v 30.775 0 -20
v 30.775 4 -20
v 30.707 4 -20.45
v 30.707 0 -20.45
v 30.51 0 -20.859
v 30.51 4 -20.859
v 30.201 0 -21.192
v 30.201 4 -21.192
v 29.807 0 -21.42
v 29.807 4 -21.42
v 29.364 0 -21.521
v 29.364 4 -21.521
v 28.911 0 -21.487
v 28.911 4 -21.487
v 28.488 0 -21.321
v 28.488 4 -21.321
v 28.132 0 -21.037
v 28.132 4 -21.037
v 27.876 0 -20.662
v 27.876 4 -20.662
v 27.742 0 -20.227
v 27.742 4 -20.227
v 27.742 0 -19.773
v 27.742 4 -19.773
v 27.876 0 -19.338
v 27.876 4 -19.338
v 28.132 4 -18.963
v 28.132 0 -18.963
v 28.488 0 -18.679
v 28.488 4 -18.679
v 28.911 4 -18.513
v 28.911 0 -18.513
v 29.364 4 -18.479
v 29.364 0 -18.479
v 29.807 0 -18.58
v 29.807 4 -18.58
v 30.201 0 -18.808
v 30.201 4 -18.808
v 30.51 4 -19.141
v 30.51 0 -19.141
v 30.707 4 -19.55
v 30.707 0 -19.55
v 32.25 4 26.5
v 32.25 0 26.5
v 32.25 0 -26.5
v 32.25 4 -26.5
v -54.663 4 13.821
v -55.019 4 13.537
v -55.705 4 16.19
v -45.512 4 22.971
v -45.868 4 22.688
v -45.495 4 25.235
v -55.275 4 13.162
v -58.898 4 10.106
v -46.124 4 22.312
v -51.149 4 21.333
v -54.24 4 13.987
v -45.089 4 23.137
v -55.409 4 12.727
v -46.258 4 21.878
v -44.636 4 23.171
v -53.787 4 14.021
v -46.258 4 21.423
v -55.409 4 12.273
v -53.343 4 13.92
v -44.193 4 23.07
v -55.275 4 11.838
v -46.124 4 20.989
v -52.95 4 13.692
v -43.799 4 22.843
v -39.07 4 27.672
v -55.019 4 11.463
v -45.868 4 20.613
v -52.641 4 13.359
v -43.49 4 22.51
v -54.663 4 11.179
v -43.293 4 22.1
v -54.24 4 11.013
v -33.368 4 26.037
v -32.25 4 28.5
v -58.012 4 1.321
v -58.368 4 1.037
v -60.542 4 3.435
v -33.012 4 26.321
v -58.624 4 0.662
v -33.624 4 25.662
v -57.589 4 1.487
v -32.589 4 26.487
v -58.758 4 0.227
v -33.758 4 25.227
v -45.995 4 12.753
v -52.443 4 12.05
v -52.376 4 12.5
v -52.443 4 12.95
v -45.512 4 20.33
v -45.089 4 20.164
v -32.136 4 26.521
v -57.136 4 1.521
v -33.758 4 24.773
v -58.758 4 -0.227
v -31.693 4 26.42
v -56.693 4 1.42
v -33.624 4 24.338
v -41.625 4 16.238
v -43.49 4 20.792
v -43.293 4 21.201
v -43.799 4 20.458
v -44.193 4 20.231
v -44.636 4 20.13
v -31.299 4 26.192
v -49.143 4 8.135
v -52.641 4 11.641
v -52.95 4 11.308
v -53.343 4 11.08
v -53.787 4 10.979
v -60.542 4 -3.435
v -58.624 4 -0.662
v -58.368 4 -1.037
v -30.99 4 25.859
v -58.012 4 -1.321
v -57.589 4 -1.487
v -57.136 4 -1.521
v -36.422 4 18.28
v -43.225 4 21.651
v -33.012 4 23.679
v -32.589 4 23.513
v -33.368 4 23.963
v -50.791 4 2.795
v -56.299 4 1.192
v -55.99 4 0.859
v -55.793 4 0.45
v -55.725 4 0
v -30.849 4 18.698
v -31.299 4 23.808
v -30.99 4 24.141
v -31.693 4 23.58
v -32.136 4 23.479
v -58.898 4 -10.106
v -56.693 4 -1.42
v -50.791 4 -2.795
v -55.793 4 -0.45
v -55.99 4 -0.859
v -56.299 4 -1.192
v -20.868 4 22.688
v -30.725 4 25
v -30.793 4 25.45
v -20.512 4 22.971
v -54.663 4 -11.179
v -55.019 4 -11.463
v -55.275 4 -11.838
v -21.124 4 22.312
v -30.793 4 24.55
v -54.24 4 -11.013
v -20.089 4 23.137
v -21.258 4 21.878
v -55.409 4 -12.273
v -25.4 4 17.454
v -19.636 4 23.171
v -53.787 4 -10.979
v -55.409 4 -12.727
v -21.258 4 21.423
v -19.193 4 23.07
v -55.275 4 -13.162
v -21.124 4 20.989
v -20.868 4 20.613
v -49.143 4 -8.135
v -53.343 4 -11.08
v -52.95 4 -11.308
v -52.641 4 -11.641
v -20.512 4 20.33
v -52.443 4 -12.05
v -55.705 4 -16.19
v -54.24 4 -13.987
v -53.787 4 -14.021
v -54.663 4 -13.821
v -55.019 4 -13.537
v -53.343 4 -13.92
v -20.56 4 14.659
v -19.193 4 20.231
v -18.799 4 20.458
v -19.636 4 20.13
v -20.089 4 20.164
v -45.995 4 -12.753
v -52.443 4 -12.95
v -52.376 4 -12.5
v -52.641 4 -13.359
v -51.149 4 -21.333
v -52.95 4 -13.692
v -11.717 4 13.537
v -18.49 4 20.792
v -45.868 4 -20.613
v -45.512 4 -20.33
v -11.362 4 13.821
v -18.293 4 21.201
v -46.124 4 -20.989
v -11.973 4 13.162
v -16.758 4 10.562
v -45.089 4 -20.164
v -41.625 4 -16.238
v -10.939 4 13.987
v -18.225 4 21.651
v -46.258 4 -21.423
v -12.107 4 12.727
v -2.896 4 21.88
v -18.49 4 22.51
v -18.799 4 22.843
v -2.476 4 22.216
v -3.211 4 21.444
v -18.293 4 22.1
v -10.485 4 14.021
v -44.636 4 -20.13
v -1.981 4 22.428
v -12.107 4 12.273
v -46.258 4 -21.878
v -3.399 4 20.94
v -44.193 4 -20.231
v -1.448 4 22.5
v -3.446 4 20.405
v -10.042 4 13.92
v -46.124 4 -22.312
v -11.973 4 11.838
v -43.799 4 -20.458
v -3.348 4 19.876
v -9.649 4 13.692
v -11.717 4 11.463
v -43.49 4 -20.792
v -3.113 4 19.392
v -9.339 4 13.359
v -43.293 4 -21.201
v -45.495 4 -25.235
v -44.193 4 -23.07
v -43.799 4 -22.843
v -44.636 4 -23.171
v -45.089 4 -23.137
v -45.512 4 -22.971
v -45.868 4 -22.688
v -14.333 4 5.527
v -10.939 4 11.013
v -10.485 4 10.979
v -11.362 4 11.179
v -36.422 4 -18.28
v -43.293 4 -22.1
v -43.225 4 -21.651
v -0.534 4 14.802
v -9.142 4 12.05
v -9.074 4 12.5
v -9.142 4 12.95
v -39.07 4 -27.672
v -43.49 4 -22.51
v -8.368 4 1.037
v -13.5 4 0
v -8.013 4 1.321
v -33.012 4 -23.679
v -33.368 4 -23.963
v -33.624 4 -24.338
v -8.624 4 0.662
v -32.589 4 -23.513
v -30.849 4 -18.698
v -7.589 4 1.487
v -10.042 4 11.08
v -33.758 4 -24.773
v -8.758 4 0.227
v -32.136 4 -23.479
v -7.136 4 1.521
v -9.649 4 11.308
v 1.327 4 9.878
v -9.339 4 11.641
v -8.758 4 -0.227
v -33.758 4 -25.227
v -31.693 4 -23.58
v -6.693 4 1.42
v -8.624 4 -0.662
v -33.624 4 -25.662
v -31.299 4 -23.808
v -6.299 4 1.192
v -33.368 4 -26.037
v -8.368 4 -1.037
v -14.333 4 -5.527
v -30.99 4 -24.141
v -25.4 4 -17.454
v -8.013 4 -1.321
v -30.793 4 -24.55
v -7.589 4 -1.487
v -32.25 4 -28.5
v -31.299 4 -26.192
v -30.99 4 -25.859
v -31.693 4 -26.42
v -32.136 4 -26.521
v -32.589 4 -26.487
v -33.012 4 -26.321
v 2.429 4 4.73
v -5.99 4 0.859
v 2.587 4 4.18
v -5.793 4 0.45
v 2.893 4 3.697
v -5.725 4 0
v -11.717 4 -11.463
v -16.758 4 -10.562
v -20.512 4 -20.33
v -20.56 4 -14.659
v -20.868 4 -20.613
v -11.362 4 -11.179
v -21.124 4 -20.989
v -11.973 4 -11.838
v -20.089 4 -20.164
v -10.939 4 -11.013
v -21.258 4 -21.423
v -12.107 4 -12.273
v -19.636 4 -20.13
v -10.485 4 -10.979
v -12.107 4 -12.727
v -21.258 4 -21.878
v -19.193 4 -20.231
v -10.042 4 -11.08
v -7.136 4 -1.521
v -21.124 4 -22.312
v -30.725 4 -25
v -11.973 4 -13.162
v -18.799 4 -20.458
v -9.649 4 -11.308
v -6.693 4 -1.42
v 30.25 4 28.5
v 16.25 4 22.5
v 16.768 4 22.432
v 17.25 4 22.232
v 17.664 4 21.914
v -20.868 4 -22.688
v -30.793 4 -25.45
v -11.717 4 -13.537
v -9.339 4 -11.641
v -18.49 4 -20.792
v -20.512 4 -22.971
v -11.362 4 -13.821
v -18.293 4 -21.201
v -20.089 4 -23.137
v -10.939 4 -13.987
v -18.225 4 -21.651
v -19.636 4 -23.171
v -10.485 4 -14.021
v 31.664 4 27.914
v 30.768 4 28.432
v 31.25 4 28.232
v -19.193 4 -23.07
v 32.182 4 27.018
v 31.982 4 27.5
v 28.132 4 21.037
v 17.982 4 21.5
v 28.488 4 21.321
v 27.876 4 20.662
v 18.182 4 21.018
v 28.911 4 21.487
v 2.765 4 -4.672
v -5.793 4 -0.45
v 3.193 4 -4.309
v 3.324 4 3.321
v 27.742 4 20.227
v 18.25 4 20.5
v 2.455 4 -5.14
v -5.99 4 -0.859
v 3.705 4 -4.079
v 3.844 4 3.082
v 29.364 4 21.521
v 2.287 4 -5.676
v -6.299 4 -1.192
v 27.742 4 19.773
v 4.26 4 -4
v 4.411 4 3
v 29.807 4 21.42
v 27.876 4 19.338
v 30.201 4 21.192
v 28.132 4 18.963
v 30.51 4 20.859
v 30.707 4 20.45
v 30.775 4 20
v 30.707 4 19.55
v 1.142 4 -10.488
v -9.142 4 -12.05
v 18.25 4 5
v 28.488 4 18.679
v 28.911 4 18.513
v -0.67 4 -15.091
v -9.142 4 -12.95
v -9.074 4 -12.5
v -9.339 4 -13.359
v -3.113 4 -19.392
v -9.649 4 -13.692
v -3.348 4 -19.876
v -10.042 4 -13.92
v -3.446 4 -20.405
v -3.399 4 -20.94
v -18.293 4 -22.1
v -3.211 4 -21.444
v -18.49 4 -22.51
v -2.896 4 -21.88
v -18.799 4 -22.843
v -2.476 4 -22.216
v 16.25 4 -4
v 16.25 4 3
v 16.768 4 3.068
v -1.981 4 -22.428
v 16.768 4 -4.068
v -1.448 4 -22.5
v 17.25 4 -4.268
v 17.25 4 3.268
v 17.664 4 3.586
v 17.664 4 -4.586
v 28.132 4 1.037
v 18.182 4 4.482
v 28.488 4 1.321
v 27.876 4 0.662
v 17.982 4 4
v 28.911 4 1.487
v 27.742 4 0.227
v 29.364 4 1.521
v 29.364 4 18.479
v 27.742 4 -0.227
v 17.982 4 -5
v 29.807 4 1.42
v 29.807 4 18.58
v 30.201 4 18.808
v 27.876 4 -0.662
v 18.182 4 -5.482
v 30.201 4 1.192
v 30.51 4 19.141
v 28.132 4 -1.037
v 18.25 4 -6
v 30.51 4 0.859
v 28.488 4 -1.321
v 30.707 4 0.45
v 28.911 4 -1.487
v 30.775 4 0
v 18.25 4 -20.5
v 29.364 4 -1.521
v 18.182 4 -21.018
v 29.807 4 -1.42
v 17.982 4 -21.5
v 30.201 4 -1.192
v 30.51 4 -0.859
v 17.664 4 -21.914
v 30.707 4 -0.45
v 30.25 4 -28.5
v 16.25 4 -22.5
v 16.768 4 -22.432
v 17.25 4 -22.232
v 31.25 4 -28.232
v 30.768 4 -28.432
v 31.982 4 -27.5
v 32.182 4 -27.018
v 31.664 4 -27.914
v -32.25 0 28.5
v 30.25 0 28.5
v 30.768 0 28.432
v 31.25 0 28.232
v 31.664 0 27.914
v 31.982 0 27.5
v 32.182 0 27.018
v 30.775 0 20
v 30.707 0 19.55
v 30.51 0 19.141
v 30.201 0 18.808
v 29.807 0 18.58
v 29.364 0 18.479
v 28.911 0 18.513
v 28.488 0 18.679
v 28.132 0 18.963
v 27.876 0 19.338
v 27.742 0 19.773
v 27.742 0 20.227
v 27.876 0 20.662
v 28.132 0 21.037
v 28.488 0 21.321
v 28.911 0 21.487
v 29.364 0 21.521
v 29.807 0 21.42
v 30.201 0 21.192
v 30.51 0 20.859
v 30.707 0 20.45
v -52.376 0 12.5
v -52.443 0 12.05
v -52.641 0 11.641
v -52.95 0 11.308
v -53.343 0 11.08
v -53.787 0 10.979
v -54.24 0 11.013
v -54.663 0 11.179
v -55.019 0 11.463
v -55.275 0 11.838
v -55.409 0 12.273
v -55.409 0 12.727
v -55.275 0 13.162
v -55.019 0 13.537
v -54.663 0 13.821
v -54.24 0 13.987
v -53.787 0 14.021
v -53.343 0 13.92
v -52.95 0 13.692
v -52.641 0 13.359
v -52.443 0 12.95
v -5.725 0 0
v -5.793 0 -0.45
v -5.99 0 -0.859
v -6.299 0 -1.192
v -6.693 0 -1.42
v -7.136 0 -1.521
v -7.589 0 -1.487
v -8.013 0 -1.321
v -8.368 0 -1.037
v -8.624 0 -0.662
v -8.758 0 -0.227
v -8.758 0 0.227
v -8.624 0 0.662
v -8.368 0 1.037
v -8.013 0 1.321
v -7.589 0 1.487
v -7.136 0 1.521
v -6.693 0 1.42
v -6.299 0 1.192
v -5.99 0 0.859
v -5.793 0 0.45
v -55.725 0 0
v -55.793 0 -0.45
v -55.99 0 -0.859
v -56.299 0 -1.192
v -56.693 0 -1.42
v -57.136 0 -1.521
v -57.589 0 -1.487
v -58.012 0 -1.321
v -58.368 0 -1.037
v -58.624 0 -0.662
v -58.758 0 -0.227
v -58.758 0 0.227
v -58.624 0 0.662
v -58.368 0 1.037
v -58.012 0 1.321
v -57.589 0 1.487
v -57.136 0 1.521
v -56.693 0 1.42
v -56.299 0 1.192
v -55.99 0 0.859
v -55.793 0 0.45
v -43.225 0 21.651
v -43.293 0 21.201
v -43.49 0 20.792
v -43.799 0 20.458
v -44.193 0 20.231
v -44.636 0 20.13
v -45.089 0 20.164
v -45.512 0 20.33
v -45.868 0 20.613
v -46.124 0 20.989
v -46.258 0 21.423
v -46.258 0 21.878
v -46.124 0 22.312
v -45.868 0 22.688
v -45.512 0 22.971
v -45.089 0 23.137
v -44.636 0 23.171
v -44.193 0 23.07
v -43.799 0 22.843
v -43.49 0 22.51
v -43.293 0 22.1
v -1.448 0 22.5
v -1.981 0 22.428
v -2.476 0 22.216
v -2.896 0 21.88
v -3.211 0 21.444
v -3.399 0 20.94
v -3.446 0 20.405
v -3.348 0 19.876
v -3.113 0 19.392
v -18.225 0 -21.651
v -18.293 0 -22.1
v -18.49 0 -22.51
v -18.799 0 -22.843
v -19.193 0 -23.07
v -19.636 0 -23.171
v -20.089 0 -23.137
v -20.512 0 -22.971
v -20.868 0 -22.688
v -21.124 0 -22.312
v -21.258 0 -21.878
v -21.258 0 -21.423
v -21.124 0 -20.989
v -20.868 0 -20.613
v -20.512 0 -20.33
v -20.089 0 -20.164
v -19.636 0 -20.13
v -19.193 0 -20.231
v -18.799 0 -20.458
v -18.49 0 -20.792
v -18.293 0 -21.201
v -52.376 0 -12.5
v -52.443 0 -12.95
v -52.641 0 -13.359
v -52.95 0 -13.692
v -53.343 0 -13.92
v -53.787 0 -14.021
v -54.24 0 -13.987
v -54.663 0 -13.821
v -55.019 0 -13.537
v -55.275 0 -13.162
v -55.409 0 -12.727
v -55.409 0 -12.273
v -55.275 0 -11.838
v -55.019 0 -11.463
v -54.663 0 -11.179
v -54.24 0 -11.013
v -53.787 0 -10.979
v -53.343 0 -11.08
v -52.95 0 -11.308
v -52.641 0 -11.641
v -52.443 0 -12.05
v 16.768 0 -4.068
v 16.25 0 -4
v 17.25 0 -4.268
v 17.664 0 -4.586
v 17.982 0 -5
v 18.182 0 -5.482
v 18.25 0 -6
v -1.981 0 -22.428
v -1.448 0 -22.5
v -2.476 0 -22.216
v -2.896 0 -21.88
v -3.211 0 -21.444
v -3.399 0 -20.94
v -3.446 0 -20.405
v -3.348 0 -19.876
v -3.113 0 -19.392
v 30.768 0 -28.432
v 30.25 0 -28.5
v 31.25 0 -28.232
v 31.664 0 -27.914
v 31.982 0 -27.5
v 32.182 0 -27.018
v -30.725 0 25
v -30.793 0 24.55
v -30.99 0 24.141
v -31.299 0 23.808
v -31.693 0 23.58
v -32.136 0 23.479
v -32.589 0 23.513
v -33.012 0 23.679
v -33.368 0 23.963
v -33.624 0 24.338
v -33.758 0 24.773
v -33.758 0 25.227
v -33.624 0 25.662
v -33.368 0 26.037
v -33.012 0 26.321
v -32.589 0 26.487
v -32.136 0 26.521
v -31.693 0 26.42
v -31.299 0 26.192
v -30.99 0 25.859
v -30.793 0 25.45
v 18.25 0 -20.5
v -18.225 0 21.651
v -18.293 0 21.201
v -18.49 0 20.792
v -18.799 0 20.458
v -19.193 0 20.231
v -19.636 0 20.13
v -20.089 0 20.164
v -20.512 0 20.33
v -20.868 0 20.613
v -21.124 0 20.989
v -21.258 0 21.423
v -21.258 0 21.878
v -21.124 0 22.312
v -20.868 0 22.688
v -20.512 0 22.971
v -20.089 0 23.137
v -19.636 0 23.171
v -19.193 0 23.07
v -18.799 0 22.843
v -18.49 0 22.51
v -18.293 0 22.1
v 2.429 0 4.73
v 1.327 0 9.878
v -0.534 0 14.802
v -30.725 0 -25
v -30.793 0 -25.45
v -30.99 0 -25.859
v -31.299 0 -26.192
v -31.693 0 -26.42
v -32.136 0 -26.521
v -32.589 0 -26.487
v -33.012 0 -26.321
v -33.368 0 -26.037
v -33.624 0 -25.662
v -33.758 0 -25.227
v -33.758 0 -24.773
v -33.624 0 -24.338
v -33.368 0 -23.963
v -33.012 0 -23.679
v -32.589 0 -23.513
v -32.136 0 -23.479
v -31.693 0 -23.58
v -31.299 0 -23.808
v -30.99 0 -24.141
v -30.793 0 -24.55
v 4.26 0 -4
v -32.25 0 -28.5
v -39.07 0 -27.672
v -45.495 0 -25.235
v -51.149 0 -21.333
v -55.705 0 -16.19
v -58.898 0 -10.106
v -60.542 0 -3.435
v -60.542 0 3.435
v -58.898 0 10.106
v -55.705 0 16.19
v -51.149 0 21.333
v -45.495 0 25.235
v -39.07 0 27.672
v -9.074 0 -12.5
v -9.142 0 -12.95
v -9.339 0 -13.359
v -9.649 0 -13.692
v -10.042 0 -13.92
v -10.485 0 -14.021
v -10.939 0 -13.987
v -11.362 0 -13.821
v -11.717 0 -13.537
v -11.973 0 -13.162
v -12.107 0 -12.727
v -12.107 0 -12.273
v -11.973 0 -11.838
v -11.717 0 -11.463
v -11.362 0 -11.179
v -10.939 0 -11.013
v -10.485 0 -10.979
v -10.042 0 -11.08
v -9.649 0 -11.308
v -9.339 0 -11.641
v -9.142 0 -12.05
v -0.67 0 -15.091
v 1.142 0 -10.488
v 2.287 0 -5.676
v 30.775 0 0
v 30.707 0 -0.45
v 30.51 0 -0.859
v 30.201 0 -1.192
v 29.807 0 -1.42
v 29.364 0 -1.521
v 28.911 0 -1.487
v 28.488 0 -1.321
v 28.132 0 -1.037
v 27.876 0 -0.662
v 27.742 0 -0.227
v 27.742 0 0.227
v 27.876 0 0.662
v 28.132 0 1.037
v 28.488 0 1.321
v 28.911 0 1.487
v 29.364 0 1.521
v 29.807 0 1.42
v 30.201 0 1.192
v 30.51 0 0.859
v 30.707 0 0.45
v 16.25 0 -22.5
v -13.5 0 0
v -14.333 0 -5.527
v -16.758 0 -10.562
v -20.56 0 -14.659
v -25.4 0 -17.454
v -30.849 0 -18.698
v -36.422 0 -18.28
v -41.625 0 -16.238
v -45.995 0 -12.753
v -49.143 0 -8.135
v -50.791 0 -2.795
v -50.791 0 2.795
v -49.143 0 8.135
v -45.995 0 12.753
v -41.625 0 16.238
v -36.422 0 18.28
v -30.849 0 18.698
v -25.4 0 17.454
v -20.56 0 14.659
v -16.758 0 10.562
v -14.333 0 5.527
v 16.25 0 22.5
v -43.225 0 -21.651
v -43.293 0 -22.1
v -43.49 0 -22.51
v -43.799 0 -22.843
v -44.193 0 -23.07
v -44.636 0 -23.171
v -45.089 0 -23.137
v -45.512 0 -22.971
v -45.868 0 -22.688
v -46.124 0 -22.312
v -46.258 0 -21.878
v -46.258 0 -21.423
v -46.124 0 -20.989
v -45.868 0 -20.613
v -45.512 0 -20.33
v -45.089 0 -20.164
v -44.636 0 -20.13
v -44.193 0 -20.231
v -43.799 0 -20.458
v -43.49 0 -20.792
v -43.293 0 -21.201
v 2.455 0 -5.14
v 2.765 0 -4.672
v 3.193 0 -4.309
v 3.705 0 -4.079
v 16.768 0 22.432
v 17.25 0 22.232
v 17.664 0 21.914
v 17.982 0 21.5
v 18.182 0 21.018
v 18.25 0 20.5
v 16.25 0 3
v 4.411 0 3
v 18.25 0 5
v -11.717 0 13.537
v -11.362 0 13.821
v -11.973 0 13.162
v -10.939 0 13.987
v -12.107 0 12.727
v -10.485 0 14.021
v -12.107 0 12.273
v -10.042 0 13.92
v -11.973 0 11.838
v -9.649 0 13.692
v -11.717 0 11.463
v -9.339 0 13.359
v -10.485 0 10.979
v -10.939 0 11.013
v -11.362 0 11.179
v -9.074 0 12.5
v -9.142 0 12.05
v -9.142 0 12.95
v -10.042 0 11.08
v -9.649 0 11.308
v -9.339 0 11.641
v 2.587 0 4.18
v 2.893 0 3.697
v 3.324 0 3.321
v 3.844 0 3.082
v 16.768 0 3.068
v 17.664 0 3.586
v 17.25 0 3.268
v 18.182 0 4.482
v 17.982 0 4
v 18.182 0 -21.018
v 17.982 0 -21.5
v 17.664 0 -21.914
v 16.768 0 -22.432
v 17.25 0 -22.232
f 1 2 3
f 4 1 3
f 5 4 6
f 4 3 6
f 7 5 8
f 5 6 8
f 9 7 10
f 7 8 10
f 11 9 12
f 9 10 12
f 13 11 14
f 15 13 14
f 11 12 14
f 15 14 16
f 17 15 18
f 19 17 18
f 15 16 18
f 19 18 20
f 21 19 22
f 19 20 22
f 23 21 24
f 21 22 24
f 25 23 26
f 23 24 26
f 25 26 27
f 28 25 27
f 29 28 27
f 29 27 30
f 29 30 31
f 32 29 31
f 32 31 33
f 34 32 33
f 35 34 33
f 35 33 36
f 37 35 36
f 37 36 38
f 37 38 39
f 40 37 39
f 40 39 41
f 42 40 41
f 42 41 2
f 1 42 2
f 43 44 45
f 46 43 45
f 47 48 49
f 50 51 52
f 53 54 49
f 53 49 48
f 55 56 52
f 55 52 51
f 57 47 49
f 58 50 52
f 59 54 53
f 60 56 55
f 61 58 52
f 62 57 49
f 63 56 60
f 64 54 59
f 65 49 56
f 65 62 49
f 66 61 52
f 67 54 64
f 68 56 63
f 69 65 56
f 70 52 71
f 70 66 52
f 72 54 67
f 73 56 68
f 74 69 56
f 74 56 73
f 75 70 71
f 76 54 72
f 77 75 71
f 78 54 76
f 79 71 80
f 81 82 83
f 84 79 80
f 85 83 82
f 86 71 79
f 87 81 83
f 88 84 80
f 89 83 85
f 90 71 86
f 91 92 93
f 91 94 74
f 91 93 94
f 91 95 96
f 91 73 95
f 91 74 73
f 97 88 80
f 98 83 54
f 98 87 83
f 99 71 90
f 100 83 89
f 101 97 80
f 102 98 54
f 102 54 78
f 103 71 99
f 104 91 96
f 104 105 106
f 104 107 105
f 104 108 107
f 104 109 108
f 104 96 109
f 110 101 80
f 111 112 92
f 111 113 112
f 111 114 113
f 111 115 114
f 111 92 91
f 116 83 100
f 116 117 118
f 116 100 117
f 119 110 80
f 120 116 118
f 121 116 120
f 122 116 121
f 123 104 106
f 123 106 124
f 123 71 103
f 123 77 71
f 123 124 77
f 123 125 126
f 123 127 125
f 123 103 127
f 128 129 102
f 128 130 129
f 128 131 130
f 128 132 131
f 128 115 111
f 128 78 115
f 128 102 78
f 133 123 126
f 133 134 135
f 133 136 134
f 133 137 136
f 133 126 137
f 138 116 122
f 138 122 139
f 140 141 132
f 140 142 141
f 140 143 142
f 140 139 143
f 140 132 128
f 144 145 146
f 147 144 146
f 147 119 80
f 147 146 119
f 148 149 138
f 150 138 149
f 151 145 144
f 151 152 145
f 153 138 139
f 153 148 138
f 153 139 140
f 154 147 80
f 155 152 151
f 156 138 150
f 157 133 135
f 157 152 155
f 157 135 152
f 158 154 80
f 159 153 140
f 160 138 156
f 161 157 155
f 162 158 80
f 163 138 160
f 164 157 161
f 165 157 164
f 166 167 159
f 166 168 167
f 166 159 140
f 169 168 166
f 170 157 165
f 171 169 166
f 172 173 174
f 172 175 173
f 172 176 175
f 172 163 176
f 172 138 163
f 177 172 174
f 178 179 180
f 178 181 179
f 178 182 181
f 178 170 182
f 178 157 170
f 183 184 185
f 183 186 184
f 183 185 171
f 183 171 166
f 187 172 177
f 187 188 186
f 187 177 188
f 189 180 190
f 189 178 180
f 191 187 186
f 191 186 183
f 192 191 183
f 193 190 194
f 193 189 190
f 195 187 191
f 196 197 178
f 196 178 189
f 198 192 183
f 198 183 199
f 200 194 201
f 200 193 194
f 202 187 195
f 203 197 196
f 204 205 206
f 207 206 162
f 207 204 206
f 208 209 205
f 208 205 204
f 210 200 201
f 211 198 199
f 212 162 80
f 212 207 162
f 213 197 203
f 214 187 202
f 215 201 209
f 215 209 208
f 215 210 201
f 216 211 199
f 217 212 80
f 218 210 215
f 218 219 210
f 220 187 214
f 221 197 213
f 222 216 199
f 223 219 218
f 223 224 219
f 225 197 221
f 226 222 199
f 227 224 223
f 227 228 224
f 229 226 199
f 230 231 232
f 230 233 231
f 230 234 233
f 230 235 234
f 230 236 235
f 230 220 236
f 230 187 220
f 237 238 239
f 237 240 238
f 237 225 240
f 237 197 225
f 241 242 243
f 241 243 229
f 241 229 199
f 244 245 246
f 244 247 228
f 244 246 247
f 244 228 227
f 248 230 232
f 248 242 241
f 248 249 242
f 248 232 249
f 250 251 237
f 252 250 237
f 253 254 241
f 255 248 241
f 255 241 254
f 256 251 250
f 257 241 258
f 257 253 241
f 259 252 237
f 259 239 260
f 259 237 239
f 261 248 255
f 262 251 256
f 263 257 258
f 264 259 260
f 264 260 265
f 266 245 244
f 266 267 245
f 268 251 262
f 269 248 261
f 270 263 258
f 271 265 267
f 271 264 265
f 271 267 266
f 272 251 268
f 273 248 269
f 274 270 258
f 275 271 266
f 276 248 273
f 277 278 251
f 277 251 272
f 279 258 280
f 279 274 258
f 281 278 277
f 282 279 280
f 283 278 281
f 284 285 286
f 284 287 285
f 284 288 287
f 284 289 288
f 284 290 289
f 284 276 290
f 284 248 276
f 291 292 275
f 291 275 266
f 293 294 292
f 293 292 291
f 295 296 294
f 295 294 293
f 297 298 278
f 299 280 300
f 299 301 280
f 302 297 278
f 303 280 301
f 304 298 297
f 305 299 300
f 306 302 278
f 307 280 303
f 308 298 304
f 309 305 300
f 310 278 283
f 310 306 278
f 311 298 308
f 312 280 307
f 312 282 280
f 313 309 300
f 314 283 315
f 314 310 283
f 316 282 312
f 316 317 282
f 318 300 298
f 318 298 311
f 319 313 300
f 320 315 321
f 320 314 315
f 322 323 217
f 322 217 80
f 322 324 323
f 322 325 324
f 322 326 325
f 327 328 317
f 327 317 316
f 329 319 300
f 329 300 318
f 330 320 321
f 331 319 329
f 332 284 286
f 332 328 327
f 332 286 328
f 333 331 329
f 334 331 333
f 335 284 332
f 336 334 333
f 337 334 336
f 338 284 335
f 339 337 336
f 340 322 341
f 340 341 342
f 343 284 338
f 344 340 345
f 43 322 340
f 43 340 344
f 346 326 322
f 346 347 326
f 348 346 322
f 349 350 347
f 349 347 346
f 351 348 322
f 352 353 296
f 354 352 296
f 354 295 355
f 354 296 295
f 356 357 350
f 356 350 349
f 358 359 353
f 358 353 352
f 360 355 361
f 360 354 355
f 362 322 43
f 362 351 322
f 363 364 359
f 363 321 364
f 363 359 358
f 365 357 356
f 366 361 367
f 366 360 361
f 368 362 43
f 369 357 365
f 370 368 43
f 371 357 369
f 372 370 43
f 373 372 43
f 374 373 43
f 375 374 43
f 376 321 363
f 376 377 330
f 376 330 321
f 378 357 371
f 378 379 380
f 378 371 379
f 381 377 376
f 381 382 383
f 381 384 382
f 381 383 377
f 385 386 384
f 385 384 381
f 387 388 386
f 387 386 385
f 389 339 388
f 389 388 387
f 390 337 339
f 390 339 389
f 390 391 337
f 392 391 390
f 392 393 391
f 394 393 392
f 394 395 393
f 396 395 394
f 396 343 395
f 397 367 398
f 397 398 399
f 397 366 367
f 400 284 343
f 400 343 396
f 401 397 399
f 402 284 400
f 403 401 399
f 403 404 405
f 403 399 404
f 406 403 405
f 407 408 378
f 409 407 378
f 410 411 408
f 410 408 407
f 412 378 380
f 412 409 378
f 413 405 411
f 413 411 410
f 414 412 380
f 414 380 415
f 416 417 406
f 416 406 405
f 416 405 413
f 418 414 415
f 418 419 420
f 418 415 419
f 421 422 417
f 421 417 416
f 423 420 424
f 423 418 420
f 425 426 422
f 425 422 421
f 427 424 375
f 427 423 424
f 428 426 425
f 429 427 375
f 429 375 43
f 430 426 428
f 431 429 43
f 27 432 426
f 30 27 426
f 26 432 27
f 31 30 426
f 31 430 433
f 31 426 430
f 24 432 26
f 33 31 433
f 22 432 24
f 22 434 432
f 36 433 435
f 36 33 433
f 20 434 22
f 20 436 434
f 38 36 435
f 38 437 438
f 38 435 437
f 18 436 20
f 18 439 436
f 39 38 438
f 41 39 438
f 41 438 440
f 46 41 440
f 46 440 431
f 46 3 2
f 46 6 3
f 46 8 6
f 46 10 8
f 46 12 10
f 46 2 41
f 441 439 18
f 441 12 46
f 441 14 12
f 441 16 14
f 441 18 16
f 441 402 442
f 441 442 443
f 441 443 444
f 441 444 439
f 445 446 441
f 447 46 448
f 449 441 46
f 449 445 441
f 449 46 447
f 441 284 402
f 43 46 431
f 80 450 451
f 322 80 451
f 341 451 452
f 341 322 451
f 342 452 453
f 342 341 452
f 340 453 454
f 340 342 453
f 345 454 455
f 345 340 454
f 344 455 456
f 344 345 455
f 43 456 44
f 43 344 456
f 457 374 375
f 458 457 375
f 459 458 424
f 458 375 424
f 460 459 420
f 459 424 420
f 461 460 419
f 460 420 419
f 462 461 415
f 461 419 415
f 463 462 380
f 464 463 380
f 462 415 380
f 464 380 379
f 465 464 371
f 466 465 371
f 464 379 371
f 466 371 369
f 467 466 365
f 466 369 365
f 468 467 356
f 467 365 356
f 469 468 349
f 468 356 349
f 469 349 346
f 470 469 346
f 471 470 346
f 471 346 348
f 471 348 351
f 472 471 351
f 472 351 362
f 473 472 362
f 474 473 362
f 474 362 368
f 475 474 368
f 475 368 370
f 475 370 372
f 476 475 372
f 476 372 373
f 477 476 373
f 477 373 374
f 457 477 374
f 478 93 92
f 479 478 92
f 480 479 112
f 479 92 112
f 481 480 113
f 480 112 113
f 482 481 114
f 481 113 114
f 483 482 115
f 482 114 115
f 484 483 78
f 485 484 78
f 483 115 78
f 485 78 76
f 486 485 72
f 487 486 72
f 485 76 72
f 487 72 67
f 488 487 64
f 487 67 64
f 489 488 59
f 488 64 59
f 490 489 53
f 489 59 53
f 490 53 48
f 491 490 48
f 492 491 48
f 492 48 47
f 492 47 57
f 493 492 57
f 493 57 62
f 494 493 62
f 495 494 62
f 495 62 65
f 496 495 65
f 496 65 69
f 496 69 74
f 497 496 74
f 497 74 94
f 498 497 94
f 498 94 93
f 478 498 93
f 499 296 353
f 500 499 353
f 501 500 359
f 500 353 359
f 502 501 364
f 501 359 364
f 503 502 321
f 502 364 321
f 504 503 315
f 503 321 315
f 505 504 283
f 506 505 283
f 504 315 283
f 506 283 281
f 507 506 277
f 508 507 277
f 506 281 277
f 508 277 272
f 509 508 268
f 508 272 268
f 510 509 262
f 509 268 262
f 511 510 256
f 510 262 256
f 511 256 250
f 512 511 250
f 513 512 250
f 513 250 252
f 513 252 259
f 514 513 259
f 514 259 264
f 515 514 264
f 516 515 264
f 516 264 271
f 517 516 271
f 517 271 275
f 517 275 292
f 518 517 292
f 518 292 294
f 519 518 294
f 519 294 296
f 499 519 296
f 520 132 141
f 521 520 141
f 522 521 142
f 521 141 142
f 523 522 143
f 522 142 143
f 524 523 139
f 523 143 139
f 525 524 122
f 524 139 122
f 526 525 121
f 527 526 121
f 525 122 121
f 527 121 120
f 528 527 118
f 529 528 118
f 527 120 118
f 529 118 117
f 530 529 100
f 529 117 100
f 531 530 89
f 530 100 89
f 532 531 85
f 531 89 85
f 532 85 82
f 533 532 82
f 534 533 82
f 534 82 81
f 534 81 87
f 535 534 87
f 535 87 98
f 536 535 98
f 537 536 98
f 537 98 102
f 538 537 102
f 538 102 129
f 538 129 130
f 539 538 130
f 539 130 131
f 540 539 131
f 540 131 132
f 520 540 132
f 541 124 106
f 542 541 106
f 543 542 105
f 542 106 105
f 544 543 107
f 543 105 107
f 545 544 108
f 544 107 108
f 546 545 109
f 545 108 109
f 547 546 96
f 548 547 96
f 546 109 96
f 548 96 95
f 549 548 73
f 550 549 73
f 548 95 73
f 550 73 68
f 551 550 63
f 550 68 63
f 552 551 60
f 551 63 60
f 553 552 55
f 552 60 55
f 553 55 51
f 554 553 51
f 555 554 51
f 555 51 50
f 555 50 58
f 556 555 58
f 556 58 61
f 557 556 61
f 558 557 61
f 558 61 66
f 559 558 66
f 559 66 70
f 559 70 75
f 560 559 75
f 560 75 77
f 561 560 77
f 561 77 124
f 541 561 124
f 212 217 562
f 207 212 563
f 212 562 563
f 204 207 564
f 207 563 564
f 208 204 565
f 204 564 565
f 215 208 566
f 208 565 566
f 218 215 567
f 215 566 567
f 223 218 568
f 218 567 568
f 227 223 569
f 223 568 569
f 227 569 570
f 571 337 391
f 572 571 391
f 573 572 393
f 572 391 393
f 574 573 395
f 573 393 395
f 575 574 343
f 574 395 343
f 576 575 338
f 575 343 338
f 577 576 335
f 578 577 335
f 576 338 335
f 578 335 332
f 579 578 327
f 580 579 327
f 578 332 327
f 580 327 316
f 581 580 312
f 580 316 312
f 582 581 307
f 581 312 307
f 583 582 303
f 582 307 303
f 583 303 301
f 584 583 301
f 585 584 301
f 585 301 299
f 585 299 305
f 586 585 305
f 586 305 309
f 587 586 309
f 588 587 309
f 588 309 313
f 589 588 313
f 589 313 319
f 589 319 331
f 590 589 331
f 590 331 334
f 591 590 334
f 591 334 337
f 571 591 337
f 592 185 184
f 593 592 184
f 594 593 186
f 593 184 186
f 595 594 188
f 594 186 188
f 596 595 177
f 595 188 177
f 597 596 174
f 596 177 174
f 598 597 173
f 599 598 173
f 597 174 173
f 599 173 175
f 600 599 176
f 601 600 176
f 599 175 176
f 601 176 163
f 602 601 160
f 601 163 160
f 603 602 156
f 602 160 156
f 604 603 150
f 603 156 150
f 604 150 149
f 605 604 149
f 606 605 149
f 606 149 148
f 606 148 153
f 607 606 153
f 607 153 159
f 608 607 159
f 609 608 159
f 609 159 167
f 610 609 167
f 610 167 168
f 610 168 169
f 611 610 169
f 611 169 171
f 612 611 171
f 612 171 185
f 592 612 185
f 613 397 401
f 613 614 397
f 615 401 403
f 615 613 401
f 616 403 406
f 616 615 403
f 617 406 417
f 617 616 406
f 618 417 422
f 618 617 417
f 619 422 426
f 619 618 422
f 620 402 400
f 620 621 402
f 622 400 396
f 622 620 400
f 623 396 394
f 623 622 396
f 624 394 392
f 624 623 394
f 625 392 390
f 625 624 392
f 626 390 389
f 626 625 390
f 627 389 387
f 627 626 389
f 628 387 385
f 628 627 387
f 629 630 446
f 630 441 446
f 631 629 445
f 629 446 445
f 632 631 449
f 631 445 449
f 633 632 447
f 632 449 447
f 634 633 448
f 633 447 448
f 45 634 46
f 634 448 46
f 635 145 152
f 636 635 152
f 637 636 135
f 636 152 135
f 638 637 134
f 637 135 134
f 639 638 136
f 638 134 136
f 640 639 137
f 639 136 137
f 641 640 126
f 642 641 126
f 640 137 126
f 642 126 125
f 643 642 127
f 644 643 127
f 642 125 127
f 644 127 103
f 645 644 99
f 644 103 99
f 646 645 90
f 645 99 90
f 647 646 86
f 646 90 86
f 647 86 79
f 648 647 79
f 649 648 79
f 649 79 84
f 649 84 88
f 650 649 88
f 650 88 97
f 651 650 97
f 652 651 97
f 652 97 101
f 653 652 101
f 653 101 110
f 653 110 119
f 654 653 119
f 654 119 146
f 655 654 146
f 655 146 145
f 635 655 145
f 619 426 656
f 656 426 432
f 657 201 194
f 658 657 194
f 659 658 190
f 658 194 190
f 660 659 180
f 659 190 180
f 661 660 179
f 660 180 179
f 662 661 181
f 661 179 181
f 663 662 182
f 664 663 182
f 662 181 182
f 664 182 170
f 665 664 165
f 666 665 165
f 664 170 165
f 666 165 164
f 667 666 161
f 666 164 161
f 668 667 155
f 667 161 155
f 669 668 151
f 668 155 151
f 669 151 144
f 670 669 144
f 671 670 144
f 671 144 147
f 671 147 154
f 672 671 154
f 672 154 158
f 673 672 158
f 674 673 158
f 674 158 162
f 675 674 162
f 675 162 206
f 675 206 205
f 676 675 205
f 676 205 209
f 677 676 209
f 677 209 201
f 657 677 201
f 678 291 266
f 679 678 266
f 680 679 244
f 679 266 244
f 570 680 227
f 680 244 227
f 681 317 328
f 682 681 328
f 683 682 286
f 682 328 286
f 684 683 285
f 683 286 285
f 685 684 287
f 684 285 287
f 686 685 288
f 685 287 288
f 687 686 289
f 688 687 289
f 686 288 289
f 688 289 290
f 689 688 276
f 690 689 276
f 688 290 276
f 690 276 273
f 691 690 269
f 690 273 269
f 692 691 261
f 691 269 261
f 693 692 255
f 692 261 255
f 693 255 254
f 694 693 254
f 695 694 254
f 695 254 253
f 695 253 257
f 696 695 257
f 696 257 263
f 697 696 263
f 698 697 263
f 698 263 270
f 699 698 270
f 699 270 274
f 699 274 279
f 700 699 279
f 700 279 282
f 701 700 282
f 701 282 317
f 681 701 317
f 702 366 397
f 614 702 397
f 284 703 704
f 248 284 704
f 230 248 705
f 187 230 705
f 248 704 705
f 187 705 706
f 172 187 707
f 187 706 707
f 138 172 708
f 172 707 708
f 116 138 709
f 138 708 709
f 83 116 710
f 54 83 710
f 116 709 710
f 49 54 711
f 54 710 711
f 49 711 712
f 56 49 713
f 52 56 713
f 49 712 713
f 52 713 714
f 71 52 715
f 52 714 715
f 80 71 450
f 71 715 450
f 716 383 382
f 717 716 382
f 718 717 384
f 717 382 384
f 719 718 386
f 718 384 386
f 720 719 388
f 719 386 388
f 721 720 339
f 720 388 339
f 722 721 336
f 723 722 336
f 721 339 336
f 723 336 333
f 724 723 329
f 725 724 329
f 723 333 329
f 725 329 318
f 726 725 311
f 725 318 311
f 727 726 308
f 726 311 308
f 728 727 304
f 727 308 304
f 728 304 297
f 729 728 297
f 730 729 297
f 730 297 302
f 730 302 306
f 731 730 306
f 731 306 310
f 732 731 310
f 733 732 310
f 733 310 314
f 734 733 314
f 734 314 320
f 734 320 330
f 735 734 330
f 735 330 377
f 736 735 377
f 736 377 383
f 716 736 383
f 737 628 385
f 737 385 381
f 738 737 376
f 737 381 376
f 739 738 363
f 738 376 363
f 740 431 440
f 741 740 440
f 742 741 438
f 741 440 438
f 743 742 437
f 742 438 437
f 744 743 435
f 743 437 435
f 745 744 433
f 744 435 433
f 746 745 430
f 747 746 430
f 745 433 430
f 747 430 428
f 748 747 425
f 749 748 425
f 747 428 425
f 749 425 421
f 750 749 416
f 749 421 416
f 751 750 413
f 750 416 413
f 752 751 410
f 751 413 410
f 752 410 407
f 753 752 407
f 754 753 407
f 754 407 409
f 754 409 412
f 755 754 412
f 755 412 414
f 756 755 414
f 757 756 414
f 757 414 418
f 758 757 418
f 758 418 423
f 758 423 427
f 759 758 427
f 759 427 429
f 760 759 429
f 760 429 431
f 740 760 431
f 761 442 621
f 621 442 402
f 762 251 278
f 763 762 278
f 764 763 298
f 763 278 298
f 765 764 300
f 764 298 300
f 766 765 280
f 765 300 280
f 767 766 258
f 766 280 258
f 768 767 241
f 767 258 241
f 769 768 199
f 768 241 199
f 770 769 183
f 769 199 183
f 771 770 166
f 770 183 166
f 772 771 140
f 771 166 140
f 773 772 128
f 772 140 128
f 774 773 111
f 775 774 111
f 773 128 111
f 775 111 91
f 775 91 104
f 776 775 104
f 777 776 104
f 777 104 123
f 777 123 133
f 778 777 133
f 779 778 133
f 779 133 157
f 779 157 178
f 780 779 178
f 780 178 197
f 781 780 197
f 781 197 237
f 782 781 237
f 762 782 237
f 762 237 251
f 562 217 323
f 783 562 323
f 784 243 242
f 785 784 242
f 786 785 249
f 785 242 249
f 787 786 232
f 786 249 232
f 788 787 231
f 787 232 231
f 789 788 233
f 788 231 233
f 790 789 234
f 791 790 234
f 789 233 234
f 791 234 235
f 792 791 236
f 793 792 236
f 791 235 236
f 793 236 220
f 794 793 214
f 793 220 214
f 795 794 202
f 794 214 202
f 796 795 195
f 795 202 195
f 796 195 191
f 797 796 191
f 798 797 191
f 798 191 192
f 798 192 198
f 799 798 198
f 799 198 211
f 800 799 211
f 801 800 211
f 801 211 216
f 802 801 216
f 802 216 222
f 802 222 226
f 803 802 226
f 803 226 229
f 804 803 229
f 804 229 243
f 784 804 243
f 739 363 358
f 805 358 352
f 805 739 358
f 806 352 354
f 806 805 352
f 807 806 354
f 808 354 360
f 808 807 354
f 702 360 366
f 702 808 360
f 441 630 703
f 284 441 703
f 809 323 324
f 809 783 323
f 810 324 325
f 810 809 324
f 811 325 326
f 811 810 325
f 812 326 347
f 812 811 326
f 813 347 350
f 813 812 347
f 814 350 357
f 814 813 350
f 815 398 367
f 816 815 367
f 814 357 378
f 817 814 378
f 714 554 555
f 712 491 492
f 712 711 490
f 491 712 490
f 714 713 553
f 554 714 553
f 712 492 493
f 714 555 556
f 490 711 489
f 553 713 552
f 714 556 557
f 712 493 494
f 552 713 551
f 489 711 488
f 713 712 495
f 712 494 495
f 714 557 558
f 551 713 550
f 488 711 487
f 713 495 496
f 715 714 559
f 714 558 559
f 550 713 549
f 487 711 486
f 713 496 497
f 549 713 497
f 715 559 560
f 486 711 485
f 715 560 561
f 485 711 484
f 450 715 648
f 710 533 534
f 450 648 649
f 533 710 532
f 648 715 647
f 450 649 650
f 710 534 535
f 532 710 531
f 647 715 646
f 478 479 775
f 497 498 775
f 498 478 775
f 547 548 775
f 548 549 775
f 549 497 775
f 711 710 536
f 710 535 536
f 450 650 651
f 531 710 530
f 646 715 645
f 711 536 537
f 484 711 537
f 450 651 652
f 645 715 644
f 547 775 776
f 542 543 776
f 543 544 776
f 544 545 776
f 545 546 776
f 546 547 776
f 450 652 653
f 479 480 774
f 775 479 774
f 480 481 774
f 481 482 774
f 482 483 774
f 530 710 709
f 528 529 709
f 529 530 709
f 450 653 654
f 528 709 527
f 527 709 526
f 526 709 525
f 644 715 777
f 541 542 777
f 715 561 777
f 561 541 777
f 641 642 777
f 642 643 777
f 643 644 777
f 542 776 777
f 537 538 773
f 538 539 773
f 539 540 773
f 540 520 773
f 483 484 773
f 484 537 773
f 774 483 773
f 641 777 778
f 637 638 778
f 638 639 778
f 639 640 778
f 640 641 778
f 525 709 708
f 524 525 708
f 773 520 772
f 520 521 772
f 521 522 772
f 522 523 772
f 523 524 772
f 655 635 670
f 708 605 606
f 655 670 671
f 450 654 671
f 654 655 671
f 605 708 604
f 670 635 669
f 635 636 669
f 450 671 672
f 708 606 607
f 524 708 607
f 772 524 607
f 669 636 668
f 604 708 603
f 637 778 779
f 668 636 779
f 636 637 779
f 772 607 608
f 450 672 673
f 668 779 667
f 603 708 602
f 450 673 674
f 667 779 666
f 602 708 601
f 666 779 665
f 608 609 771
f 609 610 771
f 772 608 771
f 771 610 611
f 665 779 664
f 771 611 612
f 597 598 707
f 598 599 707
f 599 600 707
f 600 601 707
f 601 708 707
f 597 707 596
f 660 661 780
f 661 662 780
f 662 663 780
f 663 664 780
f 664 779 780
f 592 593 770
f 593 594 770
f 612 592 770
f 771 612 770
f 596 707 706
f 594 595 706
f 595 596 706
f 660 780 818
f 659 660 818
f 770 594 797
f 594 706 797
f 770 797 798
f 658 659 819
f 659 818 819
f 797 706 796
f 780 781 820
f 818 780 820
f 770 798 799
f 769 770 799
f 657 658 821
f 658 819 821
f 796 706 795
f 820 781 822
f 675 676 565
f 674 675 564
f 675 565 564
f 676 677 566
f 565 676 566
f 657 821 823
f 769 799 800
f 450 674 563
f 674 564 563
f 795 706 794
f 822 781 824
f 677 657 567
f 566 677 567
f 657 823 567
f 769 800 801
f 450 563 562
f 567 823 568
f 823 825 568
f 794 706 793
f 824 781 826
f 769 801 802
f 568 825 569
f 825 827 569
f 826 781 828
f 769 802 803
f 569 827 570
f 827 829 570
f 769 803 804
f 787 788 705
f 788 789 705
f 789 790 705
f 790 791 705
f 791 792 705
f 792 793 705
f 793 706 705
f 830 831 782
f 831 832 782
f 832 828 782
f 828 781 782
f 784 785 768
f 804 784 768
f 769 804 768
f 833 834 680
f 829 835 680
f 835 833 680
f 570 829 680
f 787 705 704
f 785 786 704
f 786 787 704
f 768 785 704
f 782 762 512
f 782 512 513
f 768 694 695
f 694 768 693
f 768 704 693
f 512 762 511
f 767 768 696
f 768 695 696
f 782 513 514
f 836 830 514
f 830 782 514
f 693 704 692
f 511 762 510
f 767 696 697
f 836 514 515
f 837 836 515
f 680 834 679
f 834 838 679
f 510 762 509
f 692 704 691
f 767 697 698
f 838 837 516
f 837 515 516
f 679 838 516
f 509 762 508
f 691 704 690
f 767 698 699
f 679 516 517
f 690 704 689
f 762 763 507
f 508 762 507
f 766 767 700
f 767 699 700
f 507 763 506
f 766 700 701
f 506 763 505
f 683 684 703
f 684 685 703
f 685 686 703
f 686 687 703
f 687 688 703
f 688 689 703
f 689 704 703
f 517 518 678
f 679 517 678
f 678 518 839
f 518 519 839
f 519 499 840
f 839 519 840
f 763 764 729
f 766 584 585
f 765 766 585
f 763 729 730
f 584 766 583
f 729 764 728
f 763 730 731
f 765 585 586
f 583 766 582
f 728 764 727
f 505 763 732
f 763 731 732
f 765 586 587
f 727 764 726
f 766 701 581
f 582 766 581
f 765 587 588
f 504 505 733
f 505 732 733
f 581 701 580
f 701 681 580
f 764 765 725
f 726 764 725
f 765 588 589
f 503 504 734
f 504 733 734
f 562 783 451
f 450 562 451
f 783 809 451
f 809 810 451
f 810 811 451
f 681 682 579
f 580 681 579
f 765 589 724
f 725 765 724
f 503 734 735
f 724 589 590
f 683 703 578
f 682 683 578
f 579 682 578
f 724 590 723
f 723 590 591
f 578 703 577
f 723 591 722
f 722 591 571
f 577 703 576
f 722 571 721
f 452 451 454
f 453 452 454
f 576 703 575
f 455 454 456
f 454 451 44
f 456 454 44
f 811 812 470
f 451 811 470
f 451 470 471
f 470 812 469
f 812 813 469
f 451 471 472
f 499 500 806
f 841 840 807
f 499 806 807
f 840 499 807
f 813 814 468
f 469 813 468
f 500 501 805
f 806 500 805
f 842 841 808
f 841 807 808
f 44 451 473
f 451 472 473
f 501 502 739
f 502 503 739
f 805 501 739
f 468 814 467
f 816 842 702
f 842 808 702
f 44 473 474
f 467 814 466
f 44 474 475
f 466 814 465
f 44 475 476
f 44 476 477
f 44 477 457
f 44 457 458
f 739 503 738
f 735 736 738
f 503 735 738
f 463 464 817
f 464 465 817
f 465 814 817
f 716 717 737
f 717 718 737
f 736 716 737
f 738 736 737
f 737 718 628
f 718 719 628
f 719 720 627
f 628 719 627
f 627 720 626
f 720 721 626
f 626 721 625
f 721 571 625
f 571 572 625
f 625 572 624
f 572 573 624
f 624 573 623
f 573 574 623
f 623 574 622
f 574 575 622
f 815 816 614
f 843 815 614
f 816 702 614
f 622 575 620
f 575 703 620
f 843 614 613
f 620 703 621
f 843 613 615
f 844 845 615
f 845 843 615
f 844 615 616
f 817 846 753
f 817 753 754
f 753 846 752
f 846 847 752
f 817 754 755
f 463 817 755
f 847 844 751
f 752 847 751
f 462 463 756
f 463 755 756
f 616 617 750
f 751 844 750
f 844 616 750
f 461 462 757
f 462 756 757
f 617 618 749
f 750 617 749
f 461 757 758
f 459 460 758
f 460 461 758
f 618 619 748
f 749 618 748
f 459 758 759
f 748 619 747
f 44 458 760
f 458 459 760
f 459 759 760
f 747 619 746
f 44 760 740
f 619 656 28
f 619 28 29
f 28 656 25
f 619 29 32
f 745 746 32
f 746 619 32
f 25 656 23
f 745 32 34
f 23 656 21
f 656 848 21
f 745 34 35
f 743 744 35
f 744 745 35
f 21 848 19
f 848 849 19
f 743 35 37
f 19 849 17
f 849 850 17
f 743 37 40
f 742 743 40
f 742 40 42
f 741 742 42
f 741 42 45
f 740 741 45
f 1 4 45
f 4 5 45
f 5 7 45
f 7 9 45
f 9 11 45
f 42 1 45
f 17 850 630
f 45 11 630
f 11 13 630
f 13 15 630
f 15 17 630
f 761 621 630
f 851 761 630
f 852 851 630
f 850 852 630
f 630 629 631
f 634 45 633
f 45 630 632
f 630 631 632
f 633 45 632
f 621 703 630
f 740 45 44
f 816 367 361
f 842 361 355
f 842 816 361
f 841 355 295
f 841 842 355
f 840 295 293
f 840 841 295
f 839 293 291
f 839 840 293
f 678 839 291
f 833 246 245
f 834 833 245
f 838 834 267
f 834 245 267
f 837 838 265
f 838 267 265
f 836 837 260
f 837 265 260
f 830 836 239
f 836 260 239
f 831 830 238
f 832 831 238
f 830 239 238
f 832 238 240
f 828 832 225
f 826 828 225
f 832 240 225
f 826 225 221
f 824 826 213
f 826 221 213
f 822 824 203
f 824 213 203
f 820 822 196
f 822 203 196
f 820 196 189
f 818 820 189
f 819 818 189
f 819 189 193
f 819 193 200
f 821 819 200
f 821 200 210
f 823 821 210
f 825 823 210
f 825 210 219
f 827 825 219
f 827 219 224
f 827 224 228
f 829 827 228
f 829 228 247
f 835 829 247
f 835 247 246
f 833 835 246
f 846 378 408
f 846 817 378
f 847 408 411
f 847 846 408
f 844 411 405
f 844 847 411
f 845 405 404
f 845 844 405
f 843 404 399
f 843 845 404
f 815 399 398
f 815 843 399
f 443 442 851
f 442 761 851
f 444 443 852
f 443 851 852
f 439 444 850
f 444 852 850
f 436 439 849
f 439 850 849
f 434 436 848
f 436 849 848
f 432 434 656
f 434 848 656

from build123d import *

# Parameters (mm, degrees)
EXTRUDE_1_DEPTH     = 4
SKETCH_2_R          = 1.525
CUT_EXTRUDE_1_DEPTH = 5
SKETCH_4_R          = 10
CUT_EXTRUDE_2_DEPTH = 5
SKETCH_7_R          = 18.75
CUT_EXTRUDE_4_DEPTH = 5
SKETCH_8_R          = 1.525
CUT_EXTRUDE_5_DEPTH = 5
SKETCH_9_R          = 1.525
CUT_EXTRUDE_6_DEPTH = 5
FILLET_1_R          = 2
CUT_EXTRUDE_8_DEPTH = 5
FILLET_2_R          = 2


with BuildPart() as part:
    # 草图1 → 凸台-拉伸1 (new body)
    with BuildSketch(Plane(origin=(0, 0, 0), x_dir=(1, 0, 0), z_dir=(0, 1, 0))):
        with BuildLine():
            ThreePointArc((-32.25, 28.5), (-60.75, 0), (-32.25, -28.5))
            Line((-32.25, -28.5), (-32.25, 28.5))
        make_face()
        with BuildLine():
            Line((-32.25, 28.5), (-32.25, -28.5))
            ThreePointArc((-32.25, -28.5), (-12.097456736, -20.152543264), (-3.75, 0))
            ThreePointArc((-3.75, 0), (-12.097456736, 20.152543264), (-32.25, 28.5))
        make_face()
        with BuildLine():
            ThreePointArc((-3.75, 0), (-12.097456736, -20.152543264), (-32.25, -28.5))
            Line((-32.25, -28.5), (32.25, -28.5))
            Line((32.25, -28.5), (32.25, 28.5))
            Line((32.25, 28.5), (-32.25, 28.5))
            ThreePointArc((-32.25, 28.5), (-12.097456736, 20.152543264), (-3.75, 0))
        make_face()
    extrude(amount=EXTRUDE_1_DEPTH)

    # 草图2 → 切除-拉伸1 (cut, through all)
    with BuildSketch(Plane(origin=(0, 4, 0), x_dir=(1, 0, 0), z_dir=(0, 1, 0))):
        with Locations((-45.75, 0)):
            Circle(SKETCH_2_R)
        with Locations((-39, 11.691342951)):
            Circle(SKETCH_2_R)
        with Locations((-25.5, 11.691342951)):
            Circle(SKETCH_2_R)
        with Locations((-18.75, 0)):
            Circle(SKETCH_2_R)
        with Locations((-25.5, -11.691342951)):
            Circle(SKETCH_2_R)
        with Locations((-39, -11.691342951)):
            Circle(SKETCH_2_R)
    extrude(amount=-CUT_EXTRUDE_1_DEPTH, mode=Mode.SUBTRACT)

    # 草图4 → 切除-拉伸2 (cut, through all)
    with BuildSketch(Plane(origin=(0, 4, 0), x_dir=(1, 0, 0), z_dir=(0, 1, 0))):
        with Locations((-32.25, 0)):
            Circle(SKETCH_4_R)
    extrude(amount=-CUT_EXTRUDE_2_DEPTH, mode=Mode.SUBTRACT)

    # 草图7 → 切除-拉伸4 (cut, through all)
    with BuildSketch(Plane(origin=(0, 4, 0), x_dir=(1, 0, 0), z_dir=(0, 1, 0))):
        with Locations((-32.25, 0)):
            Circle(SKETCH_7_R)
    extrude(amount=-CUT_EXTRUDE_4_DEPTH, mode=Mode.SUBTRACT)

    # 草图8 → 切除-拉伸5 (cut, through all)
    with BuildSketch(Plane(origin=(0, 4, 0), x_dir=(1, 0, 0), z_dir=(0, 1, 0))):
        with Locations((-32.25, 25)):
            Circle(SKETCH_8_R)
        with Locations((-19.75, 21.650635095)):
            Circle(SKETCH_8_R)
        with Locations((-10.599364905, 12.5)):
            Circle(SKETCH_8_R)
        with Locations((-7.25, 0)):
            Circle(SKETCH_8_R)
        with Locations((-10.599364905, -12.5)):
            Circle(SKETCH_8_R)
        with Locations((-19.75, -21.650635095)):
            Circle(SKETCH_8_R)
        with Locations((-32.25, -25)):
            Circle(SKETCH_8_R)
        with Locations((-44.75, -21.650635095)):
            Circle(SKETCH_8_R)
        with Locations((-53.900635095, -12.5)):
            Circle(SKETCH_8_R)
        with Locations((-57.25, 0)):
            Circle(SKETCH_8_R)
        with Locations((-53.900635095, 12.5)):
            Circle(SKETCH_8_R)
        with Locations((-44.75, 21.650635095)):
            Circle(SKETCH_8_R)
    extrude(amount=-CUT_EXTRUDE_5_DEPTH, mode=Mode.SUBTRACT)

    # 草图9 → 切除-拉伸6 (cut, through all)
    with BuildSketch(Plane(origin=(0, 4, 0), x_dir=(1, 0, 0), z_dir=(0, 1, 0))):
        with Locations((29.25, 0)):
            Circle(SKETCH_9_R)
        with Locations((29.25, 20)):
            Circle(SKETCH_9_R)
        with Locations((29.25, -20)):
            Circle(SKETCH_9_R)
    extrude(amount=-CUT_EXTRUDE_6_DEPTH, mode=Mode.SUBTRACT)

    # 圆角1
    fillet_1_edges = [part.edges().sort_by_distance(p)[0] for p in [
        (32.25, 2, -28.5),
        (32.25, 2, 28.5),
    ]]
    fillet(fillet_1_edges, radius=FILLET_1_R)

    # 草图18 → 切除-拉伸8 (cut, through all)
    with BuildSketch(Plane(origin=(0, 4, 0), x_dir=(1, 0, 0), z_dir=(0, 1, 0))):
        with BuildLine():
            Line((18.25, 22.5), (-5.440486763, 22.5))
            ThreePointArc((-5.440486763, 22.5), (-0.100467085, 13.835011143), (2.520677301, 4))
            Line((2.520677301, 4), (18.25, 4))
            Line((18.25, 4), (18.25, 22.5))
        make_face()
        with BuildLine():
            Line((-5.440486763, -22.5), (18.25, -22.5))
            Line((18.25, -22.5), (18.25, -3))
            Line((18.25, -3), (2.621191548, -3))
            ThreePointArc((2.621191548, -3), (0.094857948, -13.371991785), (-5.440486763, -22.5))
        make_face()
    extrude(amount=-CUT_EXTRUDE_8_DEPTH, mode=Mode.SUBTRACT)

    # 圆角2
    fillet_2_edges = [part.edges().sort_by_distance(p)[0] for p in [
        (2.520677301, 2, -4),
        (-5.440486763, 2, -22.5),
        (18.25, 2, -22.5),
        (18.25, 2, -4),
        (-5.440486763, 2, 22.5),
        (2.621191548, 2, 3),
        (18.25, 2, 3),
        (18.25, 2, 22.5),
    ]]
    fillet(fillet_2_edges, radius=FILLET_2_R)


solid = part.part
